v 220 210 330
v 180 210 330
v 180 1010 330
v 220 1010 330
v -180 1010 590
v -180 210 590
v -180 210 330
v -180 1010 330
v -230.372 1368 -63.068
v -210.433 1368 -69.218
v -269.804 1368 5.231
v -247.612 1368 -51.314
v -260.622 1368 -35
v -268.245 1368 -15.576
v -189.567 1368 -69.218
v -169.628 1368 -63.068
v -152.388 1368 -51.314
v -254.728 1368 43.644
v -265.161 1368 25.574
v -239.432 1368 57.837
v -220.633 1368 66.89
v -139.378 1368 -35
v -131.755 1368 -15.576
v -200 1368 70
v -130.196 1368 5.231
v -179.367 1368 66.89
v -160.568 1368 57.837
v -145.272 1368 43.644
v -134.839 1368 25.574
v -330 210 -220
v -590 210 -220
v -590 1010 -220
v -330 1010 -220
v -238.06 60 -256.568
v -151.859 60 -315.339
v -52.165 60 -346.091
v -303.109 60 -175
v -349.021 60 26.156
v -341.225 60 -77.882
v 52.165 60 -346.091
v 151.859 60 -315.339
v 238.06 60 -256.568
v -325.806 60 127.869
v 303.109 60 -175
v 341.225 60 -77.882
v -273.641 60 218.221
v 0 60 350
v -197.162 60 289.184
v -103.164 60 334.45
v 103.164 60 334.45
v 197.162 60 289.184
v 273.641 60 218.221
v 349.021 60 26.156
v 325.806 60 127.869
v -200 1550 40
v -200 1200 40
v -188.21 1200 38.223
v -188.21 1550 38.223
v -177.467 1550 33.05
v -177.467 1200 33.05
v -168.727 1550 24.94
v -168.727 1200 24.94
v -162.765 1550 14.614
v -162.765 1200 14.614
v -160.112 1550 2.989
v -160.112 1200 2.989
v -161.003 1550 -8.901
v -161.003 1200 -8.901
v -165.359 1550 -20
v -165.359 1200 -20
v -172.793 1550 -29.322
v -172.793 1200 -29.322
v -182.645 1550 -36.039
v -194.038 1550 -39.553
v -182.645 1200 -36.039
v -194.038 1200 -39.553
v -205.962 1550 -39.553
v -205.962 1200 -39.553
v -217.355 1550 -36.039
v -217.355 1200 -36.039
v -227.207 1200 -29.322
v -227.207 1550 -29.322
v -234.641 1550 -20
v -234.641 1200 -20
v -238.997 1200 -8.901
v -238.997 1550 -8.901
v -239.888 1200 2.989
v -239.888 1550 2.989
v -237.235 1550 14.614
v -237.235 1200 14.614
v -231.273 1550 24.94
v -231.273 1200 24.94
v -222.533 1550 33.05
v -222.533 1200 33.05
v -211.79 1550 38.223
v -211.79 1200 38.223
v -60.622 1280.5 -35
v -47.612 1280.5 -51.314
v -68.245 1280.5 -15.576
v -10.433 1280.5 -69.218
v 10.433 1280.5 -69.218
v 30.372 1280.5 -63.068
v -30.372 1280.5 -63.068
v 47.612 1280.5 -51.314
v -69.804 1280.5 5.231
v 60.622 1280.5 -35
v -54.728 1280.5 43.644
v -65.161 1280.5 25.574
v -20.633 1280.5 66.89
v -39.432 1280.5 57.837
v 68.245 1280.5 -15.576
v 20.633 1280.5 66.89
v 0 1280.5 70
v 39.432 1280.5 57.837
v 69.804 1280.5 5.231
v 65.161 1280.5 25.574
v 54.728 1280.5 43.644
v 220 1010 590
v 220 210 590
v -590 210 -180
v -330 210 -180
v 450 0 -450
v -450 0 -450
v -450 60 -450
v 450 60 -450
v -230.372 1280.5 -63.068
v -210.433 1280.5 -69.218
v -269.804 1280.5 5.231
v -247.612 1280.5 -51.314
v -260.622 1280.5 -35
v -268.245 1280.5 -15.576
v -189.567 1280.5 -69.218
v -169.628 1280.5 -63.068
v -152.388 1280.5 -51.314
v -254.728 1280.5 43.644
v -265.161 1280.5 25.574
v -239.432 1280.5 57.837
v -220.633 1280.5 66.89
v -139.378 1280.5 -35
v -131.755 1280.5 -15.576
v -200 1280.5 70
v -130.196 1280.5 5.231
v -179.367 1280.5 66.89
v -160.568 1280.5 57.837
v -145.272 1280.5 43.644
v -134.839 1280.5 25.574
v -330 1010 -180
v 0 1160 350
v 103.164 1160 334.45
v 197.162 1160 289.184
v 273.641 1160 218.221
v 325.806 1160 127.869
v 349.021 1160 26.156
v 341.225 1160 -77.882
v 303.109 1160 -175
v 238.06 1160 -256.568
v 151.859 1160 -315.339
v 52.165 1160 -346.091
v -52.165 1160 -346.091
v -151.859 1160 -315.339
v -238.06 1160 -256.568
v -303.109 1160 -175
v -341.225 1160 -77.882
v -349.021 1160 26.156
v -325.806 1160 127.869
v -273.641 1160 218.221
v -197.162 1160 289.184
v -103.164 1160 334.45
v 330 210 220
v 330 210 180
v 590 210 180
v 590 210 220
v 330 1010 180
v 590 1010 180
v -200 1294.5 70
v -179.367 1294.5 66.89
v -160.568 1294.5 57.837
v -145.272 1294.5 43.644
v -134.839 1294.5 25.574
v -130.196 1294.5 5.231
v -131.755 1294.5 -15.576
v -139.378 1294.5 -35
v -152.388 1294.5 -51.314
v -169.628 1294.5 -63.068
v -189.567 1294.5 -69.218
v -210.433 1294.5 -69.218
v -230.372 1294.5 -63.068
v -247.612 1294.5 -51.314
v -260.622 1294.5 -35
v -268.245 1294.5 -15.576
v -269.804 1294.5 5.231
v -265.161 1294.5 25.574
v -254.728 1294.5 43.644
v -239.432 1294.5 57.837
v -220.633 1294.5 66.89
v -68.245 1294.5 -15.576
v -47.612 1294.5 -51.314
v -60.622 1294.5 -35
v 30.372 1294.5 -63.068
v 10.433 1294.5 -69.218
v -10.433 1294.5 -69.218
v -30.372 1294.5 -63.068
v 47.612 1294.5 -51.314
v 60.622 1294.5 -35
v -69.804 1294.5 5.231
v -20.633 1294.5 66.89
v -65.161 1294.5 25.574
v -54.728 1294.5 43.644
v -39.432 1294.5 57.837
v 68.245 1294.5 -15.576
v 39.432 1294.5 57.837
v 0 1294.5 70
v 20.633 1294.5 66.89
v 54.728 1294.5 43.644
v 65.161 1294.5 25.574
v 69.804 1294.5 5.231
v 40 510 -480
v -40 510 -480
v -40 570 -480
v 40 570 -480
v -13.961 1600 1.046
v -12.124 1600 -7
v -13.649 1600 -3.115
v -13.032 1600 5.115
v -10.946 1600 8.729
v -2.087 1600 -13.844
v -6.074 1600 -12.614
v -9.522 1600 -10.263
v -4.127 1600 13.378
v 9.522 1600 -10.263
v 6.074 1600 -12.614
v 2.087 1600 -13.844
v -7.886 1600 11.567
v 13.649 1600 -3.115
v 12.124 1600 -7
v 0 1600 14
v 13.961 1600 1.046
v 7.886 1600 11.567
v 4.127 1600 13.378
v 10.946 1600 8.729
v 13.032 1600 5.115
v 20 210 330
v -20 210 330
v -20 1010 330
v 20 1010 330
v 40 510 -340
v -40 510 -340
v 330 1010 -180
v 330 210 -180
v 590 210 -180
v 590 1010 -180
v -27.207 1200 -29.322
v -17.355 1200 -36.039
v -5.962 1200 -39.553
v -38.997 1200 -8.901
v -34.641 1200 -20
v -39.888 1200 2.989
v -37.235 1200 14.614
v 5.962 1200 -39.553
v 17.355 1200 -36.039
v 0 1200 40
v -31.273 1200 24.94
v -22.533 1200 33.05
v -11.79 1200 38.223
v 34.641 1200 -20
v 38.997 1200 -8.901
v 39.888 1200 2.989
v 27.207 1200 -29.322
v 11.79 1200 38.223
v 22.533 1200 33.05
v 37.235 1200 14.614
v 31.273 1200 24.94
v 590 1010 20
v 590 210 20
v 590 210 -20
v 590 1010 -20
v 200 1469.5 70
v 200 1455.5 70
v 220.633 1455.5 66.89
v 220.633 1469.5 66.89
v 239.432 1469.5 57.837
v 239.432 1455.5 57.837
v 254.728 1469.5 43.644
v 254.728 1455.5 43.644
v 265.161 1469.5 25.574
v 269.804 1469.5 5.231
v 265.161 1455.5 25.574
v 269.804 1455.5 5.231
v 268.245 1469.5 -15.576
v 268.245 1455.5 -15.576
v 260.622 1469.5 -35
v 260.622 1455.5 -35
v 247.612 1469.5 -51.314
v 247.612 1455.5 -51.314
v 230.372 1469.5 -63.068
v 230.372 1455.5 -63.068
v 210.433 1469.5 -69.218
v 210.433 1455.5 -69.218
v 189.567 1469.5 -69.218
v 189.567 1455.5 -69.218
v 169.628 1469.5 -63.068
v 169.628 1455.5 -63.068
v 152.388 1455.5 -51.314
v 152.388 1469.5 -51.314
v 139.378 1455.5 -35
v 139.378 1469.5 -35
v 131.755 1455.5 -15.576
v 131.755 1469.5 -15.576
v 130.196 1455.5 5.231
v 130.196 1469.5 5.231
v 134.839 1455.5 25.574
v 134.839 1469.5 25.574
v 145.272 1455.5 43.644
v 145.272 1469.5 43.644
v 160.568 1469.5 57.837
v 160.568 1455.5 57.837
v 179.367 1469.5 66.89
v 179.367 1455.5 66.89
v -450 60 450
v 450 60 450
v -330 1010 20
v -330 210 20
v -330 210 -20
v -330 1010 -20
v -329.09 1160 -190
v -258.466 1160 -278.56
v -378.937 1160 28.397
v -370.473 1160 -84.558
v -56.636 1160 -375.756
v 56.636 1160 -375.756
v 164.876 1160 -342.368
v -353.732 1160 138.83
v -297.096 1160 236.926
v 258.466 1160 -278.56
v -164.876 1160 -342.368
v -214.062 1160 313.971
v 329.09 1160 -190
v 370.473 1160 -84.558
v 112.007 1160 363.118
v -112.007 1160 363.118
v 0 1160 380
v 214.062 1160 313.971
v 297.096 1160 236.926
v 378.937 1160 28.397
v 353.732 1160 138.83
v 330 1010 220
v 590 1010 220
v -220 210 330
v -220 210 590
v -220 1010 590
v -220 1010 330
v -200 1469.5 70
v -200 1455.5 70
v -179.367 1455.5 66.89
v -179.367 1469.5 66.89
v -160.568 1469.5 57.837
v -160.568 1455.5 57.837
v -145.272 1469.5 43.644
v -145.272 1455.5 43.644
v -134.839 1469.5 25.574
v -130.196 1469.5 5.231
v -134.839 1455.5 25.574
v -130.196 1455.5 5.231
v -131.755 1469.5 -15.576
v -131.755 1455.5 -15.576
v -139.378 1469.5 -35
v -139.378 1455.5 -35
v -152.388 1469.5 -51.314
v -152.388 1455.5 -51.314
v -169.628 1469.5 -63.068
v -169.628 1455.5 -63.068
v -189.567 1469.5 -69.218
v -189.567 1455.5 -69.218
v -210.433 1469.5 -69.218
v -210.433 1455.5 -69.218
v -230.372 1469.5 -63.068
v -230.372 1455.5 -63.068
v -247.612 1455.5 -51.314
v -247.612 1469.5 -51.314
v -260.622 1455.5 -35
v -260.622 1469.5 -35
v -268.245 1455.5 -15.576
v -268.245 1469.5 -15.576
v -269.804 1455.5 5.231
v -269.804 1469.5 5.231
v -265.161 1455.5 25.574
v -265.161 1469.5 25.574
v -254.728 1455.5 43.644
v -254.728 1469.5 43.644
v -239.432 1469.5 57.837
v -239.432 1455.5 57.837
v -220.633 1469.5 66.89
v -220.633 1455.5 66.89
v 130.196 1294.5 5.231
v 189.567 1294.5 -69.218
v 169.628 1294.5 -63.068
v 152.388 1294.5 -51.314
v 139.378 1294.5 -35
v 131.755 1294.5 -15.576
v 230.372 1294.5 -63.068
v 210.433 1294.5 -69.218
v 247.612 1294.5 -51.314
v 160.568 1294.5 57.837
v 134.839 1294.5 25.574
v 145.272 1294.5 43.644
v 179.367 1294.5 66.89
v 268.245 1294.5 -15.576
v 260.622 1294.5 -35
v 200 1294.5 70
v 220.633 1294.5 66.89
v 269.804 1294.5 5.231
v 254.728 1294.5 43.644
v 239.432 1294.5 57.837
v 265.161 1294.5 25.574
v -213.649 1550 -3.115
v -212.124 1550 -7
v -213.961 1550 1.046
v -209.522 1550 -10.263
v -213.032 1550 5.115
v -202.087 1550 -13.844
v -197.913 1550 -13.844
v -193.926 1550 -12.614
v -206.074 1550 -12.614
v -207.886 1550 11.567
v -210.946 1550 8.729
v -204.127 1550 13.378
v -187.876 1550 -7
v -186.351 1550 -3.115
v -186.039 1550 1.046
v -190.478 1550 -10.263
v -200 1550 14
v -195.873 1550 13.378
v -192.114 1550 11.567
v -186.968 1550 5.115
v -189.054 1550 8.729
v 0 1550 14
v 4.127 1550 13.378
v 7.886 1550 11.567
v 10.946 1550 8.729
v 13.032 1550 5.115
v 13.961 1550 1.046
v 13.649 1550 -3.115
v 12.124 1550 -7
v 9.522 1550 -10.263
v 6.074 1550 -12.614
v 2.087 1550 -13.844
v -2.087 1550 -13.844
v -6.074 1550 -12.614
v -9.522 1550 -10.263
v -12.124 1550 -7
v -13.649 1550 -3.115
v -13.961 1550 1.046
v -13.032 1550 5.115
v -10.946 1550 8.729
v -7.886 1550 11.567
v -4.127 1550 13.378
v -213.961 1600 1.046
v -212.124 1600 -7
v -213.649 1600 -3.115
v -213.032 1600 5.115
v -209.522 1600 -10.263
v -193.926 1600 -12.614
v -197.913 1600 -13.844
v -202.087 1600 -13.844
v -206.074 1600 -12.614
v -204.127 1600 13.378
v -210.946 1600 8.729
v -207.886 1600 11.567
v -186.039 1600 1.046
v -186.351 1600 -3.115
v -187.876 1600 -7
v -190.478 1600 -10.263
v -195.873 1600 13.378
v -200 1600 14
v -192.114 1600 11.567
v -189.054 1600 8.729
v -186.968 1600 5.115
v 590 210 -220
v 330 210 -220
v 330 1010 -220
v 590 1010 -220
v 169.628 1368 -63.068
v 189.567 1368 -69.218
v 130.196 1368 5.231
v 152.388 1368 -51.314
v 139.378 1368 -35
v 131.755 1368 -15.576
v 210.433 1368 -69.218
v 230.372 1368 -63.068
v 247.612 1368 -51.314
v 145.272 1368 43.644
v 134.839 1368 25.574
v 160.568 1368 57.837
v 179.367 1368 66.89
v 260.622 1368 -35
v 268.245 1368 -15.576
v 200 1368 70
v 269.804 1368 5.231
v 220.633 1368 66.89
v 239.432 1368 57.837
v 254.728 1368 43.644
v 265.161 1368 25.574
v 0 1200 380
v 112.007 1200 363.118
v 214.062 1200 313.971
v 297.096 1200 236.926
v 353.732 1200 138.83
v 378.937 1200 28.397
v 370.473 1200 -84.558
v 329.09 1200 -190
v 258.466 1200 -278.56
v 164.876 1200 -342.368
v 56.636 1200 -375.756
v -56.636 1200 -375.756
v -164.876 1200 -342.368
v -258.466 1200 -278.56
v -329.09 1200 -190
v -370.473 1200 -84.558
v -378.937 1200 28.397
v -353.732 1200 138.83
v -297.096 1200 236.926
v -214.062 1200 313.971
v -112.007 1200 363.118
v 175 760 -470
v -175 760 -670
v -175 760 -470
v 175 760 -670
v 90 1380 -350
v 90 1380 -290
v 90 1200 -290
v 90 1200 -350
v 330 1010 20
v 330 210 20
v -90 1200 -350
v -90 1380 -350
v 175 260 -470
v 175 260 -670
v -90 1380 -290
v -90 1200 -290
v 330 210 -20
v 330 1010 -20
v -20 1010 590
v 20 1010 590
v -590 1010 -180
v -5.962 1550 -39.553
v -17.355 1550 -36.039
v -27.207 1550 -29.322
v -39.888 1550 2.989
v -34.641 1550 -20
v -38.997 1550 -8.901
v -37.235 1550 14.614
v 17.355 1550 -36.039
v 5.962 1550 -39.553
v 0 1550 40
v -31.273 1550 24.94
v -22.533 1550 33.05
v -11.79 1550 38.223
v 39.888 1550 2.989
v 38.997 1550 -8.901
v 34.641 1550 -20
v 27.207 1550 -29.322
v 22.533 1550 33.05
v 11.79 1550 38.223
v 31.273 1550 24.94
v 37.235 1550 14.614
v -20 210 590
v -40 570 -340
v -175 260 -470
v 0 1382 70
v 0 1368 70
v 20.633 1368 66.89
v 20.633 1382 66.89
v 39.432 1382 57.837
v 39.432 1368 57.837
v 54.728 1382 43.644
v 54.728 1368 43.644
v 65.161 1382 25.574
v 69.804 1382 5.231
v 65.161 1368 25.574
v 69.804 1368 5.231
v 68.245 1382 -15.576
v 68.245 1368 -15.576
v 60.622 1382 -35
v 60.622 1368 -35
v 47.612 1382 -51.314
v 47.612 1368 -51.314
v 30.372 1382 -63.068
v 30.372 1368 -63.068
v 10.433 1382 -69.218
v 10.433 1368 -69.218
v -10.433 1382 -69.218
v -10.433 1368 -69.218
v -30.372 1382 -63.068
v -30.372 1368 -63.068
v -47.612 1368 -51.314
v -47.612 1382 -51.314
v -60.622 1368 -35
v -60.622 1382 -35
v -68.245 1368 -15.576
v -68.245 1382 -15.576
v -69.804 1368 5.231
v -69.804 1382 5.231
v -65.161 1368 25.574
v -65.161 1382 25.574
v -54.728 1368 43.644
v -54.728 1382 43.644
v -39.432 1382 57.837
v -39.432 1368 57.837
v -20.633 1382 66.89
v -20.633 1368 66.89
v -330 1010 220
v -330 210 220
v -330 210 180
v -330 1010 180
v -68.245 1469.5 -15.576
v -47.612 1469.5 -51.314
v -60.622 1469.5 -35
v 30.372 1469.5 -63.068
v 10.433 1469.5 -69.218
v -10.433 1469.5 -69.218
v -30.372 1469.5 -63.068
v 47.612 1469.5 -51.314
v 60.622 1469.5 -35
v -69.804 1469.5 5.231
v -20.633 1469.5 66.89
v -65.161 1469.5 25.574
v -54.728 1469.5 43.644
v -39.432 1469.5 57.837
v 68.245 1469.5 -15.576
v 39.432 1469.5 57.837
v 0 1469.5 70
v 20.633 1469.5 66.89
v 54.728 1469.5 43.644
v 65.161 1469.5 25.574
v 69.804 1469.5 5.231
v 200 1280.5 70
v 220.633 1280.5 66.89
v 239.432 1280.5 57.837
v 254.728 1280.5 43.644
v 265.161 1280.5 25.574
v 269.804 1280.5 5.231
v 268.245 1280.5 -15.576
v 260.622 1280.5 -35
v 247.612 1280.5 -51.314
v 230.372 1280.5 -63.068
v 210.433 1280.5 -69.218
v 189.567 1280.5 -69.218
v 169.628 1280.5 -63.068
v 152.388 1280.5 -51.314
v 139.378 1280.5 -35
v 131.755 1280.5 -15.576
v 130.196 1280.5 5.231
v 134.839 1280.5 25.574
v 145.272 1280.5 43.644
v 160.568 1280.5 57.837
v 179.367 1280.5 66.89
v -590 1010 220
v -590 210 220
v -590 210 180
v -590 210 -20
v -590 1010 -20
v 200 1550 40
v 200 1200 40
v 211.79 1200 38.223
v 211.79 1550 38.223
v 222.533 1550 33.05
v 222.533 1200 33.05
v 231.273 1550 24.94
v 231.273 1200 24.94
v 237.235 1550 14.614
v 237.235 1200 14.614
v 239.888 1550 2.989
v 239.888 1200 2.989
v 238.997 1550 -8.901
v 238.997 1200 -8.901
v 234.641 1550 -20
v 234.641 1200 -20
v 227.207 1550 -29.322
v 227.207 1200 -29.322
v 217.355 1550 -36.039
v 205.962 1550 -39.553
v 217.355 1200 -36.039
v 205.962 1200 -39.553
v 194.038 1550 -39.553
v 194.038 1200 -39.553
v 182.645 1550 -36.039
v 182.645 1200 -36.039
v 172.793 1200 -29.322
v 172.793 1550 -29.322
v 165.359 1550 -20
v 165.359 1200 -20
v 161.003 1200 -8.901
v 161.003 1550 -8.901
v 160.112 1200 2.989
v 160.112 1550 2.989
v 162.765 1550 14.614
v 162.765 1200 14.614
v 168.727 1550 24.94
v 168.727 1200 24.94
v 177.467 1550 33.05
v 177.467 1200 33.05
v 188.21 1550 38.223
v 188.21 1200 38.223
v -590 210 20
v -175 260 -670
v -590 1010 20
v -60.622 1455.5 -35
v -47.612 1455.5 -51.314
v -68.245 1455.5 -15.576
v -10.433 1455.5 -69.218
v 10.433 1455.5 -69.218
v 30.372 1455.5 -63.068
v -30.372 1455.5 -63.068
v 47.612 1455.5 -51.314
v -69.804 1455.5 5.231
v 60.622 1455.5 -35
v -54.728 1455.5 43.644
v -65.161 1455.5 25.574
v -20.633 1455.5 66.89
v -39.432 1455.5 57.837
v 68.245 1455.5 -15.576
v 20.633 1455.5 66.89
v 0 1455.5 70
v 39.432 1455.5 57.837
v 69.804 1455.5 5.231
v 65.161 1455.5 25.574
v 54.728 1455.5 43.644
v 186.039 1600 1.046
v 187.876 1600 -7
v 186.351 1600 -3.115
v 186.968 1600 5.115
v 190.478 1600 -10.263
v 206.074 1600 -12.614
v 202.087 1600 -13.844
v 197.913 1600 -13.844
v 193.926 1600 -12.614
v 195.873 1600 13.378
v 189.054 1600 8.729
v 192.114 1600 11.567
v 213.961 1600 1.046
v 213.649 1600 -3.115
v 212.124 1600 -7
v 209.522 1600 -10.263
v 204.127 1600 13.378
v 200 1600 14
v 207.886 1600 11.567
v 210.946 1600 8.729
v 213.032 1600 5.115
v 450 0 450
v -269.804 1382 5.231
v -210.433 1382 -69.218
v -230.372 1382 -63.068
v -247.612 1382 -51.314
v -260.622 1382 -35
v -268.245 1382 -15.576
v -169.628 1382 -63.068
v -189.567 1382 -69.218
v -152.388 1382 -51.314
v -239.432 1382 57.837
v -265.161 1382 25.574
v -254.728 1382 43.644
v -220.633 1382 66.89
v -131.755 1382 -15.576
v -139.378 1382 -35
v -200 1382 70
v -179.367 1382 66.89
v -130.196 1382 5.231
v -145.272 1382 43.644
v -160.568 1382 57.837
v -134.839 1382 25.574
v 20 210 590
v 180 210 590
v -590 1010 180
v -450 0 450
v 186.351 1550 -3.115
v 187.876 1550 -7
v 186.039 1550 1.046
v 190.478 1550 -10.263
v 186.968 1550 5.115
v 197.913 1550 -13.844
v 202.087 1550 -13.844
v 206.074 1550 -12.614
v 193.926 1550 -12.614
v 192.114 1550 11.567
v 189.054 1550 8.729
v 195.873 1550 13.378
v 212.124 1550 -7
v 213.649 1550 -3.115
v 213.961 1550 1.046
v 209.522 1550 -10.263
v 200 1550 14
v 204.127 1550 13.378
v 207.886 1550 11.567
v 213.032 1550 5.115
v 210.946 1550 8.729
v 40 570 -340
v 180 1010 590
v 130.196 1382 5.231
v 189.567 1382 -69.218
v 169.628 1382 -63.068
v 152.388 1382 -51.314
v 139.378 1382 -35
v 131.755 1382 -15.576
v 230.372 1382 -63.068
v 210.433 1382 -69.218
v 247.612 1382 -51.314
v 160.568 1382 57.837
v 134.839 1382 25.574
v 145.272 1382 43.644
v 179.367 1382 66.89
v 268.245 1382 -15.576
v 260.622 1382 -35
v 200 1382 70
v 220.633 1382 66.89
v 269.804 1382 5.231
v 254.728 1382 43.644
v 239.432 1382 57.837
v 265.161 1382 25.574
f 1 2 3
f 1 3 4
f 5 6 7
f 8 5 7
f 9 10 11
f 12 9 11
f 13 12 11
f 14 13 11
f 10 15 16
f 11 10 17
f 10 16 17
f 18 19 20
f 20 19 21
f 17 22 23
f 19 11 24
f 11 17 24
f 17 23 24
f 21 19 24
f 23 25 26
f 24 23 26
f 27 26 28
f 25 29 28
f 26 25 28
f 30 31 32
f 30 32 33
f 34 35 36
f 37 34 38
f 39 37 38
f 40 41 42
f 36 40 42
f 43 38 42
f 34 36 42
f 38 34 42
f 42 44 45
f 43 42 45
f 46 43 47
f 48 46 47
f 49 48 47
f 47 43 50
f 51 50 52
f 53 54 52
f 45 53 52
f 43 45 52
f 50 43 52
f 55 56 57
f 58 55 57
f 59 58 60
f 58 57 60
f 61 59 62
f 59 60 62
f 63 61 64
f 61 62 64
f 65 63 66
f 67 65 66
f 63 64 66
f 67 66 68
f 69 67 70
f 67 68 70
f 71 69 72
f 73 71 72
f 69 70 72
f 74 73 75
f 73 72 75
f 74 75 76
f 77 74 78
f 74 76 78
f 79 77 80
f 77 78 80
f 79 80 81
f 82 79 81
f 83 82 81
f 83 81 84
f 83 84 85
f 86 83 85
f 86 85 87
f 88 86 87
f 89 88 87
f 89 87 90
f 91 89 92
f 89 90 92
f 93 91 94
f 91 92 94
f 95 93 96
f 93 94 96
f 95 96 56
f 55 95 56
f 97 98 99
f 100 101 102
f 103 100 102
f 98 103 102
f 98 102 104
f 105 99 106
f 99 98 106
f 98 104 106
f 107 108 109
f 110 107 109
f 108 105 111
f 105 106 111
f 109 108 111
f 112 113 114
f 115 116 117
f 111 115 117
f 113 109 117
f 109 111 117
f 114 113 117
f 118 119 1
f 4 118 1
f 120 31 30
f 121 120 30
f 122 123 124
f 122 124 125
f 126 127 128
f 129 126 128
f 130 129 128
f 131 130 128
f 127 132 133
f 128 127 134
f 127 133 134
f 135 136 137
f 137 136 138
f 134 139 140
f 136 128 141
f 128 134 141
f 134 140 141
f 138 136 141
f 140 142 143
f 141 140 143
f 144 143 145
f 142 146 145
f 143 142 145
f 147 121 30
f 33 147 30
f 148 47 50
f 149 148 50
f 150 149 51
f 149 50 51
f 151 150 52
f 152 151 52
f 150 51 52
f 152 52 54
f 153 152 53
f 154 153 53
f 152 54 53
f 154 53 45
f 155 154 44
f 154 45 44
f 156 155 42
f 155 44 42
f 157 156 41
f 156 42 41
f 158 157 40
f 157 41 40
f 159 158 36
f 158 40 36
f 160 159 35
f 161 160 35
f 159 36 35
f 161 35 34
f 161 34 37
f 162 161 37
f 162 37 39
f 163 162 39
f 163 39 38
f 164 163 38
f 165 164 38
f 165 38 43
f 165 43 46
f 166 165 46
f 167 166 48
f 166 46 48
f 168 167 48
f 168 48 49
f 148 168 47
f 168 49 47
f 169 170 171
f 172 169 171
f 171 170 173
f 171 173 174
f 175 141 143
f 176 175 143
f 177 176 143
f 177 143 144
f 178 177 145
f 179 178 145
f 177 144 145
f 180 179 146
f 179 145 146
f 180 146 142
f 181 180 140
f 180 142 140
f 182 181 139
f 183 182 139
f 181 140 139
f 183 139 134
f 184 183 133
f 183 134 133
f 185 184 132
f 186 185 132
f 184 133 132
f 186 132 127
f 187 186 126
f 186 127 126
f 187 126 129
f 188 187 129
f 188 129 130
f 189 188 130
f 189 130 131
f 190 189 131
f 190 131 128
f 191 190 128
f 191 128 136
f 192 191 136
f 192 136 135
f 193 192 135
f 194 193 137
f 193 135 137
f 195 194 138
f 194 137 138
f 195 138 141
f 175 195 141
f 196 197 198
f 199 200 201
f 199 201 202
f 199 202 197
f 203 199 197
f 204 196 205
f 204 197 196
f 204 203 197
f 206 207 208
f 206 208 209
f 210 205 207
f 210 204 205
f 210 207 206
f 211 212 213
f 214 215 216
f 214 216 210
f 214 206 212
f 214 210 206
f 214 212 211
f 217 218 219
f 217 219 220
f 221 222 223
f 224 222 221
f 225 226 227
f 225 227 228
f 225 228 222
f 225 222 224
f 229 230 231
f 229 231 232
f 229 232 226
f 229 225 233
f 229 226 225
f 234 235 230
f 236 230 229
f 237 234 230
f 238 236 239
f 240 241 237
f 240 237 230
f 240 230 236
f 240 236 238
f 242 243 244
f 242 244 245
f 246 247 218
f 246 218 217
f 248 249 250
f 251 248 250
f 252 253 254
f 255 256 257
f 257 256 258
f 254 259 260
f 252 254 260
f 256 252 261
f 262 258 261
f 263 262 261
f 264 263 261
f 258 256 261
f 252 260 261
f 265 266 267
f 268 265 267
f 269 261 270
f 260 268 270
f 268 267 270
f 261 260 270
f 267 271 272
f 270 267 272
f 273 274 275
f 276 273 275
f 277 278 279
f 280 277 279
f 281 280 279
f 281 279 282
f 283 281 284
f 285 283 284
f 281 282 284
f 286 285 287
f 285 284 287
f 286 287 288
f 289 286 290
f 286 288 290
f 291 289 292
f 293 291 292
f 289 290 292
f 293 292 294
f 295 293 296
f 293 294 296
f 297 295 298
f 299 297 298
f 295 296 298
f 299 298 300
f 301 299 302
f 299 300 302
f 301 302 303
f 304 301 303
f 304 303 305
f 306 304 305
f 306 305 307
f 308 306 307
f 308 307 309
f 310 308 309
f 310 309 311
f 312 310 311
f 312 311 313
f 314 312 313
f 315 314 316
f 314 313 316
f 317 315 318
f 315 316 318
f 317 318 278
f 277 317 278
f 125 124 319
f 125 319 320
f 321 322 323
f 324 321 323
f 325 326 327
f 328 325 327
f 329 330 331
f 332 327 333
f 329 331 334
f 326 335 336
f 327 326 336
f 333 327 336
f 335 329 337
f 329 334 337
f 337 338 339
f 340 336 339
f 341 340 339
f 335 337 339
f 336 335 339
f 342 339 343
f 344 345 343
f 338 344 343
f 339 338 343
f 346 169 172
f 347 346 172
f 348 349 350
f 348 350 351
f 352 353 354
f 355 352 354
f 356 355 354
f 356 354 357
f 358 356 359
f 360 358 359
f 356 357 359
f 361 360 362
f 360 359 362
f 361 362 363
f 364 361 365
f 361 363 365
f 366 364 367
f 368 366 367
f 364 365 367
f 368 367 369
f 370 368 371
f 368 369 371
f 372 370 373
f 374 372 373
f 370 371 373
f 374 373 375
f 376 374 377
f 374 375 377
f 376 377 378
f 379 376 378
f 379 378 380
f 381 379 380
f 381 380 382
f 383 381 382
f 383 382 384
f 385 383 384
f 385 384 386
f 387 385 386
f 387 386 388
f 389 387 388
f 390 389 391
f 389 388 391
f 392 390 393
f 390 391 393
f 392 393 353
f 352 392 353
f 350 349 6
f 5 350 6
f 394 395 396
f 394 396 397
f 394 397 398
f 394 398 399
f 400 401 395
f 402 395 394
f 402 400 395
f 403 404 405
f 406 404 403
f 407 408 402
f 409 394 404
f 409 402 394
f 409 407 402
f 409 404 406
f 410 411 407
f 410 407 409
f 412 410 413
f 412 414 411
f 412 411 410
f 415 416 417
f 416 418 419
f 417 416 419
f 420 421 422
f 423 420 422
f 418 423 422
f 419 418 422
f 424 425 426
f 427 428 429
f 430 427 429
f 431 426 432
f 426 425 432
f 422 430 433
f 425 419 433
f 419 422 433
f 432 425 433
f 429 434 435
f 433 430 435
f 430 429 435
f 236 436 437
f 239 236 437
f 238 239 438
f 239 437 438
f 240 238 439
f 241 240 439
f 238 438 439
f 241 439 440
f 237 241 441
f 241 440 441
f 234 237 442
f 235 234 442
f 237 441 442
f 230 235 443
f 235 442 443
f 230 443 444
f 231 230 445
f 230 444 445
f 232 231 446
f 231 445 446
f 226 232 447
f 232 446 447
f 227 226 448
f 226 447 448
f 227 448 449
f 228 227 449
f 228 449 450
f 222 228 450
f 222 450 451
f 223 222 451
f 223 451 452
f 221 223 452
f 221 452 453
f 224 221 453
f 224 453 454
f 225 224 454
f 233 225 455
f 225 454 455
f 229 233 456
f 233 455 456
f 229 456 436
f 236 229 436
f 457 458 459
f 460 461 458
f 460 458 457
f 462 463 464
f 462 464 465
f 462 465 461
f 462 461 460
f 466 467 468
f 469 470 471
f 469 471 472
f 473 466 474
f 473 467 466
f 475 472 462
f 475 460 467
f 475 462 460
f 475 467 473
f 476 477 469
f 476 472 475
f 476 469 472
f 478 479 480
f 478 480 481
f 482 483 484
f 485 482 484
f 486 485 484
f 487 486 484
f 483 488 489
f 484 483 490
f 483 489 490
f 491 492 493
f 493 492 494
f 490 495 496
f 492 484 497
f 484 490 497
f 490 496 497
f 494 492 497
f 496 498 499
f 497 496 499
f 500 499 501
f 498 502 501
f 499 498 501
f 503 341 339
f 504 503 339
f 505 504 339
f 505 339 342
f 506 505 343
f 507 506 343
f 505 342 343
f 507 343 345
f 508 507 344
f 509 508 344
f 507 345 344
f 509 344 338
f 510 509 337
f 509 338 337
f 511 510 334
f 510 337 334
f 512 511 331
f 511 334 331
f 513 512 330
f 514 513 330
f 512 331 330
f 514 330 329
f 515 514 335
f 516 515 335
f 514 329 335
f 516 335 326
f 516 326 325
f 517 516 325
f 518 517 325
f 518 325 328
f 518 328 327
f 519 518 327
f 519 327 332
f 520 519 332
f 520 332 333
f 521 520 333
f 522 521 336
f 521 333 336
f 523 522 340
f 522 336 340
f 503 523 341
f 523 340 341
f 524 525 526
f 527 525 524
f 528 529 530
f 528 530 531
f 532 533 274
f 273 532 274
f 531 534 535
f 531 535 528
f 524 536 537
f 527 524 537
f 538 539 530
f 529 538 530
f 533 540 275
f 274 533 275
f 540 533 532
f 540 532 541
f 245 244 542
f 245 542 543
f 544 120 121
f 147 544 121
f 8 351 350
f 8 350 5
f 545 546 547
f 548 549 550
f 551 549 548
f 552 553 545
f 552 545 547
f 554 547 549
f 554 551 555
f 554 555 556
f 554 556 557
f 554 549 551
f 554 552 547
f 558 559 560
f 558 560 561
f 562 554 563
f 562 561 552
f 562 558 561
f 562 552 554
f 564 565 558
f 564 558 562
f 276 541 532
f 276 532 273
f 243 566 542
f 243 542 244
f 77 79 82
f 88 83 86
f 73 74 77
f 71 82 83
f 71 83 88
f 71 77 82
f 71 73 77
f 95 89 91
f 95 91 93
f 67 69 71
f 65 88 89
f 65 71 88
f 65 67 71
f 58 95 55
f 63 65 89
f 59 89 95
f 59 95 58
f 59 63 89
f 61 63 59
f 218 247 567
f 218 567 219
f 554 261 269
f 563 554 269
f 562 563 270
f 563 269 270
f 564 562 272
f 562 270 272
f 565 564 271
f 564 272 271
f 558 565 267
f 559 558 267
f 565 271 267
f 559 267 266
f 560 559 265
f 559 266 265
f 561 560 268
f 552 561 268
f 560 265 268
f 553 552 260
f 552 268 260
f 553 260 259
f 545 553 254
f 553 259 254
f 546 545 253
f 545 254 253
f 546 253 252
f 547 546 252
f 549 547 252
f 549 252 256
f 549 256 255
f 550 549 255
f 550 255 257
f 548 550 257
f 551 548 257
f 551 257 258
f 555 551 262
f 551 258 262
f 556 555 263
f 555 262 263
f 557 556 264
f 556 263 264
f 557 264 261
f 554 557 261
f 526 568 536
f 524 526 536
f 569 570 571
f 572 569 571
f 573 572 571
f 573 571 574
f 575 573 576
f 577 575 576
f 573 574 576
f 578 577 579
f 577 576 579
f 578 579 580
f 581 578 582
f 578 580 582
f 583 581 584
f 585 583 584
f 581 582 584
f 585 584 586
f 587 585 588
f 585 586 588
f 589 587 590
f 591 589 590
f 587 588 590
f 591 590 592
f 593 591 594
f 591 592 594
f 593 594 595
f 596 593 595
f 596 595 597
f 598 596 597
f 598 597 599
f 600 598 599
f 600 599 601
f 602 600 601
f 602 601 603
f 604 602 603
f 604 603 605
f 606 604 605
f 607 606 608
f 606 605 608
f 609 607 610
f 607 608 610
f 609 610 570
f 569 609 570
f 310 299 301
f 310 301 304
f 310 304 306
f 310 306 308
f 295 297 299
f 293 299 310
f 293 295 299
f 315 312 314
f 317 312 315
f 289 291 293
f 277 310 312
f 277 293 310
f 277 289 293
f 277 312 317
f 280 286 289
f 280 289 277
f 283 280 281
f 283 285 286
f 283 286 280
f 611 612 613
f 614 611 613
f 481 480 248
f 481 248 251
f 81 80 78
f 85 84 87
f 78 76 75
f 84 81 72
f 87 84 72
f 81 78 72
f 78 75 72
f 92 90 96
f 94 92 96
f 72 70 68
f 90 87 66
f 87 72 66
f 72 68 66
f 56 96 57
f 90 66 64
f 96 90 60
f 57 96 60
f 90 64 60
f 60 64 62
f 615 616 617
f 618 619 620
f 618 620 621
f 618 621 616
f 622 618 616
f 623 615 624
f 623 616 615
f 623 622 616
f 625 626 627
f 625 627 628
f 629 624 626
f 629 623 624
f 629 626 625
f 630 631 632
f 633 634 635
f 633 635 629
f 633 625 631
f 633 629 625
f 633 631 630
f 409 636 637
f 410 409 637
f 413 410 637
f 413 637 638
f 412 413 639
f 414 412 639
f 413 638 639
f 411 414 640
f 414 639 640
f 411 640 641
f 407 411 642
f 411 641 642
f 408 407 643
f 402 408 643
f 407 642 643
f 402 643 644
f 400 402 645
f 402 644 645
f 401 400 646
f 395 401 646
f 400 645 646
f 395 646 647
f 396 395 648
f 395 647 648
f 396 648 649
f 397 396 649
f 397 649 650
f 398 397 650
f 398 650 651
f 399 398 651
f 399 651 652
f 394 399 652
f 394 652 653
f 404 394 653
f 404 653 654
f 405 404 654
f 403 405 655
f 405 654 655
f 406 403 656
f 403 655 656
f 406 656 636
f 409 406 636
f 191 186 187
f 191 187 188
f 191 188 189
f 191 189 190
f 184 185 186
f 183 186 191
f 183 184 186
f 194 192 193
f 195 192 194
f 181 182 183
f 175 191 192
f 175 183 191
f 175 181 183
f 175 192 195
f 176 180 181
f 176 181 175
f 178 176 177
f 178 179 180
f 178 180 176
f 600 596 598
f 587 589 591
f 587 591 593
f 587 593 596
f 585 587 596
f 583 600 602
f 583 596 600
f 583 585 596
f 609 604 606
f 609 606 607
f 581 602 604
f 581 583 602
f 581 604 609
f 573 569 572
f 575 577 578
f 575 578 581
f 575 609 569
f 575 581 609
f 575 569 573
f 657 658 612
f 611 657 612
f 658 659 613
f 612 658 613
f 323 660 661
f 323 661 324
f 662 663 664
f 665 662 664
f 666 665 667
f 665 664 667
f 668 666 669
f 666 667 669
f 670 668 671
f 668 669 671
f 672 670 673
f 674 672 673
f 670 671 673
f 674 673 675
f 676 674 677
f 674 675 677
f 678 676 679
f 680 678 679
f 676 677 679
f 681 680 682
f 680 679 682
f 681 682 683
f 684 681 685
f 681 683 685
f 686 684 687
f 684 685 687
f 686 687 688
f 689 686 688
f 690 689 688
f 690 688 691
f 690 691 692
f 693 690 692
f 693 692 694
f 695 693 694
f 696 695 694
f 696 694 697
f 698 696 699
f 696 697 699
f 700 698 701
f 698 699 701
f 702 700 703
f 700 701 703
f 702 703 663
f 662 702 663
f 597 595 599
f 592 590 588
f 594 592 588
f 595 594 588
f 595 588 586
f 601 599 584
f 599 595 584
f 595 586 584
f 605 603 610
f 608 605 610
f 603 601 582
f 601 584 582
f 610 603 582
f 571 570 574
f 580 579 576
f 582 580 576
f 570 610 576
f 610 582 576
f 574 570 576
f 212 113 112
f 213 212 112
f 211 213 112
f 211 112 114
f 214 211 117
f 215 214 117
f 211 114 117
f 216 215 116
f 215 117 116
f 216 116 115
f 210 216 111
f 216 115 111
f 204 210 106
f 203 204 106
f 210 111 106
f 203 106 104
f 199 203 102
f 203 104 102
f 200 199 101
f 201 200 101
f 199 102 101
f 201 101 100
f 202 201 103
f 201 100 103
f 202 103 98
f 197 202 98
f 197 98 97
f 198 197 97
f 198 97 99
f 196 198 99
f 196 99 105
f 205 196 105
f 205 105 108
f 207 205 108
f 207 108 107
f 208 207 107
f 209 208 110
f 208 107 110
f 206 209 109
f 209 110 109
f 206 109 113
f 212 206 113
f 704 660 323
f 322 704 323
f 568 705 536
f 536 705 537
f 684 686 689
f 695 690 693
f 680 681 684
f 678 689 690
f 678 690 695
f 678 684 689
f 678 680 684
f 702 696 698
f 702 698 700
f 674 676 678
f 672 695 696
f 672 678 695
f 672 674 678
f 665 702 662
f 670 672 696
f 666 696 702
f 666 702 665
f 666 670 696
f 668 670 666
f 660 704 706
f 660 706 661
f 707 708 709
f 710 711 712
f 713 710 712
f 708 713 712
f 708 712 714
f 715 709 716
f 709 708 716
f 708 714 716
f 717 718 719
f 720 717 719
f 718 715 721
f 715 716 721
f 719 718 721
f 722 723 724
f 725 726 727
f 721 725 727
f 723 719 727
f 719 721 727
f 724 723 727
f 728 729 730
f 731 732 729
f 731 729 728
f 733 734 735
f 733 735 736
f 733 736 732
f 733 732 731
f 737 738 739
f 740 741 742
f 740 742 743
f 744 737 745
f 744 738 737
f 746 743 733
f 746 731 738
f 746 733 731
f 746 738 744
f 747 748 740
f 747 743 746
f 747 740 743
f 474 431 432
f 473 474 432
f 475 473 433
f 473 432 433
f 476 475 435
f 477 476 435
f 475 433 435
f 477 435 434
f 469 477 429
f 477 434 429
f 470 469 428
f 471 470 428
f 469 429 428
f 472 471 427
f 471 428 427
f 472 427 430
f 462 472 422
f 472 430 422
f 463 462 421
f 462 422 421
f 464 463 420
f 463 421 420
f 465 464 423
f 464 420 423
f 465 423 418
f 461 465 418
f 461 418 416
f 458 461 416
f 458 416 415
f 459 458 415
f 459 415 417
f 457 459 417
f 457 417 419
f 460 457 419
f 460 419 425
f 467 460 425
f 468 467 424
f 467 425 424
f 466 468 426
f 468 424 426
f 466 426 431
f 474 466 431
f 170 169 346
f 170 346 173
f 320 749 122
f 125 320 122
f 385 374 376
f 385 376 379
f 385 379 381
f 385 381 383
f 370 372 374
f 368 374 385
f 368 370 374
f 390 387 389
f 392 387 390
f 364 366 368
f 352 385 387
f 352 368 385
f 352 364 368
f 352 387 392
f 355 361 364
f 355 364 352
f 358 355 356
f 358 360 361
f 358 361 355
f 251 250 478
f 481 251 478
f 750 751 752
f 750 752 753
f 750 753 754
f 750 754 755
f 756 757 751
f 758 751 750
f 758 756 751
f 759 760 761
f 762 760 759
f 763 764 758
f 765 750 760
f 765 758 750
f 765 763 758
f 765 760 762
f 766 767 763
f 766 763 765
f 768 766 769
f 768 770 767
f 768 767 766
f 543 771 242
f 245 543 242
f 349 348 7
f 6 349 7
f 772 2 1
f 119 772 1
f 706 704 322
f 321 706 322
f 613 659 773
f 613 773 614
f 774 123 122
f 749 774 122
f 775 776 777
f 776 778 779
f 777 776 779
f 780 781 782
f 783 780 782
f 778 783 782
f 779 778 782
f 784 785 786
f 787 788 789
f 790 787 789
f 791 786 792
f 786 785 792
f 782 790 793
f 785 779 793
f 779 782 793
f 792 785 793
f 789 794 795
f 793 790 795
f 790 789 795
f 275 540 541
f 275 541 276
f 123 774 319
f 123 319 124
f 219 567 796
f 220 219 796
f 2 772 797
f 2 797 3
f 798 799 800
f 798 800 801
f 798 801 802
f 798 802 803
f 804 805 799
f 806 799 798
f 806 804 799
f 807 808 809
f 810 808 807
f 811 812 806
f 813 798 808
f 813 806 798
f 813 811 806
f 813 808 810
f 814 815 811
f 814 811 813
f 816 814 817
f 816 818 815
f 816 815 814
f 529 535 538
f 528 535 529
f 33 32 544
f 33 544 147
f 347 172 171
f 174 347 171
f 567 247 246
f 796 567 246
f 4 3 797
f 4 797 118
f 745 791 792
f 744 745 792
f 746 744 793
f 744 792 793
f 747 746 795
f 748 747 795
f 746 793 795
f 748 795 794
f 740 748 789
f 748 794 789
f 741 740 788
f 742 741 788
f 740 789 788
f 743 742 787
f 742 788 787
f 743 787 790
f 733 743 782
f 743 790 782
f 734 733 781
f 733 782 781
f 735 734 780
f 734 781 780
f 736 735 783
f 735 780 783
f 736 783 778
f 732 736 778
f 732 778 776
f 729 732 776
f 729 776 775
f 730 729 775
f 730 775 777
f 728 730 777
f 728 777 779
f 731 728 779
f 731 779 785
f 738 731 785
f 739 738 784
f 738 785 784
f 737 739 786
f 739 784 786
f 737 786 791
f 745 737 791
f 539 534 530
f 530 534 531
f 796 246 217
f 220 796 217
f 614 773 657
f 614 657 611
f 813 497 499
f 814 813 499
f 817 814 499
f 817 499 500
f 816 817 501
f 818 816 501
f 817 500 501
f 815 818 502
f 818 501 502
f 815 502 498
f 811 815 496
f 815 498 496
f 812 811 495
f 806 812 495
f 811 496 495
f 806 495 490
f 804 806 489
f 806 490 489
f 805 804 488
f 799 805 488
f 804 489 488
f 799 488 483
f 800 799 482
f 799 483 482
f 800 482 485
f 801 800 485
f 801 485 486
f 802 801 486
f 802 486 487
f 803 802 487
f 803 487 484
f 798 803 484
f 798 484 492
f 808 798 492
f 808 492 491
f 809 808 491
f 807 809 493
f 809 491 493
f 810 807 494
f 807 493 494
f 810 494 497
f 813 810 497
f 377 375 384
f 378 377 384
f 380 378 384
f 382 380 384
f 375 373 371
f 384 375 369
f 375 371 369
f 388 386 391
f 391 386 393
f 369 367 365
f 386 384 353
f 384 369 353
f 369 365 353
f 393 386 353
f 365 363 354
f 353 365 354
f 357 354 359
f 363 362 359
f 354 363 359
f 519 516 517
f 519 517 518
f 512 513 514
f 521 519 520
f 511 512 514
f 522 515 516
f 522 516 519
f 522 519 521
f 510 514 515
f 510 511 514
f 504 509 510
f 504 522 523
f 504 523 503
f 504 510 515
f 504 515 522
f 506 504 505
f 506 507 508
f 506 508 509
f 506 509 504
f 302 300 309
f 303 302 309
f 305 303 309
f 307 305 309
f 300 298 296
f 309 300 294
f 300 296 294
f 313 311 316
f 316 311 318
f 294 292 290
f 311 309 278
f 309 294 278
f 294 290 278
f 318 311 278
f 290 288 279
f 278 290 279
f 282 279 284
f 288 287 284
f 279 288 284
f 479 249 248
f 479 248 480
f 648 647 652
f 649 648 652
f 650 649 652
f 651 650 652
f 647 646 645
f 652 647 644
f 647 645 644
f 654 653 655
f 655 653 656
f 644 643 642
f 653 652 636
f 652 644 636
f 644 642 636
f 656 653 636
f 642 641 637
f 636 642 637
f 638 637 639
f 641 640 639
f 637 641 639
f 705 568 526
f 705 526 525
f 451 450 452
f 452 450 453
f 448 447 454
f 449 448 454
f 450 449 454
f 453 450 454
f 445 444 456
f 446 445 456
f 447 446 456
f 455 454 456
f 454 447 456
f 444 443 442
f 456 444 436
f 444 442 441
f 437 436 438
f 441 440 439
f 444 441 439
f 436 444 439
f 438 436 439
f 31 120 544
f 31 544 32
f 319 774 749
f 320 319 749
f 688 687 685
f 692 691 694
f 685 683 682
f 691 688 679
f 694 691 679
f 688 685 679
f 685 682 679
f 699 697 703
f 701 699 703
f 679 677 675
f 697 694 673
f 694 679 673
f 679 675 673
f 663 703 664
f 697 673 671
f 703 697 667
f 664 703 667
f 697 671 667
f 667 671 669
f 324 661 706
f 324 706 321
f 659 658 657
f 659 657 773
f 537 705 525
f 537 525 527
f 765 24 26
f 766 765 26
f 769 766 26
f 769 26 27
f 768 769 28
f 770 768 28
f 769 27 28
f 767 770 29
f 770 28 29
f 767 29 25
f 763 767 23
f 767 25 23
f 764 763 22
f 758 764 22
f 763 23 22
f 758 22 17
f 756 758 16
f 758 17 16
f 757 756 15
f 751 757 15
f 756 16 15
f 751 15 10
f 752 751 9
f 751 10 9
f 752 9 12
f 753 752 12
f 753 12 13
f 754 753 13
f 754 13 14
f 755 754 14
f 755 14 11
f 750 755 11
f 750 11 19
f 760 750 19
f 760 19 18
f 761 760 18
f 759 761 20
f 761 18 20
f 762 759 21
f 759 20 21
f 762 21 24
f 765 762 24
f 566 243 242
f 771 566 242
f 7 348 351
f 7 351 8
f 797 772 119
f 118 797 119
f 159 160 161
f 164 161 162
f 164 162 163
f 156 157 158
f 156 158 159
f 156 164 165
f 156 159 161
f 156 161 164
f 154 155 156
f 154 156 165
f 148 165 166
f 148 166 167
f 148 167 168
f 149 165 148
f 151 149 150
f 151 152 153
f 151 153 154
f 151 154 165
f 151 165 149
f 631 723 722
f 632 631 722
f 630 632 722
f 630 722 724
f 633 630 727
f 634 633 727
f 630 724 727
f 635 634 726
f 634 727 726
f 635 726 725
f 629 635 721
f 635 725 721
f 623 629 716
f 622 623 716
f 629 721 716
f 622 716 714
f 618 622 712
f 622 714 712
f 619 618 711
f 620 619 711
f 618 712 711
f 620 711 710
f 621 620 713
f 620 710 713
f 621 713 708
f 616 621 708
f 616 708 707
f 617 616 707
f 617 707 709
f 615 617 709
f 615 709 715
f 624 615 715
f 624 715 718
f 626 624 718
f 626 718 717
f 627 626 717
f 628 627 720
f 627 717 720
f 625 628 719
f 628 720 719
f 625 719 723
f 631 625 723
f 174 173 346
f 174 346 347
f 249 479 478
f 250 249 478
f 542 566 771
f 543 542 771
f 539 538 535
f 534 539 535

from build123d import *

# Parameters (mm, degrees)
SKETCH1_W                = 900
SKETCH1_H                = 900
BASE_DEPTH               = 60
TANK_START               = 60
SKETCH2_R                = 350
TANK_DEPTH               = 1100
LID_START                = 1160
SKETCH3_R                = 380
LID_DEPTH                = 40
FIN_START                = 210
SKETCH4_W                = 260
SKETCH4_H                = 40
FIN_X_1_DEPTH            = 800
SKETCH5_W                = 260
SKETCH5_H                = 40
FIN_X_1_2_DEPTH          = 800
SKETCH6_W                = 40
SKETCH6_H                = 260
FIN_Z_1_DEPTH            = 800
SKETCH7_W                = 260
SKETCH7_H                = 40
FIN_X_2_DEPTH            = 800
SKETCH8_W                = 260
SKETCH8_H                = 40
FIN_X_2_2_DEPTH          = 800
SKETCH9_W                = 40
SKETCH9_H                = 260
FIN_Z_2_DEPTH            = 800
SKETCH10_W               = 260
SKETCH10_H               = 40
FIN_X_3_DEPTH            = 800
SKETCH11_W               = 260
SKETCH11_H               = 40
FIN_X_3_2_DEPTH          = 800
SKETCH12_W               = 40
SKETCH12_H               = 260
FIN_Z_3_DEPTH            = 800
BUSHING_START            = 1200
SKETCH13_R               = 40
BUSHING_S_DEPTH          = 350
SHED_START               = 1280.5
SKETCH14_R               = 70
SHED_S_1_DEPTH           = 14
SHED_START_2             = 1368
SKETCH15_R               = 70
SHED_S_2_DEPTH           = 14
SHED_START_3             = 1455.5
SKETCH16_R               = 70
SHED_S_3_DEPTH           = 14
TERMINAL_START           = 1550
SKETCH17_R               = 14
TERMINAL_S_DEPTH         = 50
SKETCH18_R               = 40
BUSHING_L_DEPTH          = 350
SKETCH19_R               = 70
SHED_L_1_DEPTH           = 14
SKETCH20_R               = 70
SHED_L_2_DEPTH           = 14
SKETCH21_R               = 70
SHED_L_3_DEPTH           = 14
SKETCH22_R               = 14
TERMINAL_L_DEPTH         = 50
SKETCH23_R               = 40
BUSHING_SL_DEPTH         = 350
SKETCH24_R               = 70
SHED_SL_1_DEPTH          = 14
SKETCH25_R               = 70
SHED_SL_2_DEPTH          = 14
SKETCH26_R               = 70
SHED_SL_3_DEPTH          = 14
SKETCH27_R               = 14
TERMINAL_SL_DEPTH        = 50
POSITION_START           = 1200
SKETCH28_W               = 180
SKETCH28_H               = 60
POSITION_INDICATOR_DEPTH = 180
CONTROL_START            = 260
SKETCH29_W               = 350
SKETCH29_H               = 200
CONTROL_CABINET_DEPTH    = 500
CABINET_START            = 510
SKETCH30_W               = 80
SKETCH30_H               = 140
CABINET_BRACKET_DEPTH    = 60


with BuildPart() as part:
    # Sketch1 → Base (new body)
    with BuildSketch(Plane(origin=(0, 0, 0), x_dir=(1, 0, 0), z_dir=(0, 1, 0))):
        Rectangle(SKETCH1_W, SKETCH1_H)
    extrude(amount=BASE_DEPTH)


with BuildPart() as body_2:
    # Sketch2 → Tank (new body)
    with BuildSketch(Plane(origin=(0, 0, 0), x_dir=(1, 0, 0), z_dir=(0, 1, 0)).offset(TANK_START)):
        with Locations(Location((0, 0, 0), (0, 0, 270))):
            Circle(SKETCH2_R)
    extrude(amount=TANK_DEPTH)


with BuildPart() as body_3:
    # Sketch3 → Lid (new body)
    with BuildSketch(Plane(origin=(0, 0, 0), x_dir=(1, 0, 0), z_dir=(0, 1, 0)).offset(LID_START)):
        with Locations(Location((0, 0, 0), (0, 0, 270))):
            Circle(SKETCH3_R)
    extrude(amount=LID_DEPTH)


with BuildPart() as body_4:
    # Sketch4 → Fin _x 1 (new body)
    with BuildSketch(Plane(origin=(0, 0, 0), x_dir=(1, 0, 0), z_dir=(0, 1, 0)).offset(FIN_START)):
        with Locations((460, 200)):
            Rectangle(SKETCH4_W, SKETCH4_H)
    extrude(amount=FIN_X_1_DEPTH)


with BuildPart() as body_5:
    # Sketch5 → Fin -x 1 2 (new body)
    with BuildSketch(Plane(origin=(0, 0, 0), x_dir=(1, 0, 0), z_dir=(0, 1, 0)).offset(FIN_START)):
        with Locations((-460, 200)):
            Rectangle(SKETCH5_W, SKETCH5_H)
    extrude(amount=FIN_X_1_2_DEPTH)


with BuildPart() as body_6:
    # Sketch6 → Fin +z 1 (new body)
    with BuildSketch(Plane(origin=(0, 0, 0), x_dir=(1, 0, 0), z_dir=(0, 1, 0)).offset(FIN_START)):
        with Locations((-200, -460)):
            Rectangle(SKETCH6_W, SKETCH6_H)
    extrude(amount=FIN_Z_1_DEPTH)


with BuildPart() as body_7:
    # Sketch7 → Fin _x 2 (new body)
    with BuildSketch(Plane(origin=(0, 0, 0), x_dir=(1, 0, 0), z_dir=(0, 1, 0)).offset(FIN_START)):
        with Locations((460, 0)):
            Rectangle(SKETCH7_W, SKETCH7_H)
    extrude(amount=FIN_X_2_DEPTH)


with BuildPart() as body_8:
    # Sketch8 → Fin -x 2 2 (new body)
    with BuildSketch(Plane(origin=(0, 0, 0), x_dir=(1, 0, 0), z_dir=(0, 1, 0)).offset(FIN_START)):
        with Locations((-460, 0)):
            Rectangle(SKETCH8_W, SKETCH8_H)
    extrude(amount=FIN_X_2_2_DEPTH)


with BuildPart() as body_9:
    # Sketch9 → Fin +z 2 (new body)
    with BuildSketch(Plane(origin=(0, 0, 0), x_dir=(1, 0, 0), z_dir=(0, 1, 0)).offset(FIN_START)):
        with Locations((0, -460)):
            Rectangle(SKETCH9_W, SKETCH9_H)
    extrude(amount=FIN_Z_2_DEPTH)


with BuildPart() as body_10:
    # Sketch10 → Fin _x 3 (new body)
    with BuildSketch(Plane(origin=(0, 0, 0), x_dir=(1, 0, 0), z_dir=(0, 1, 0)).offset(FIN_START)):
        with Locations((460, -200)):
            Rectangle(SKETCH10_W, SKETCH10_H)
    extrude(amount=FIN_X_3_DEPTH)


with BuildPart() as body_11:
    # Sketch11 → Fin -x 3 2 (new body)
    with BuildSketch(Plane(origin=(0, 0, 0), x_dir=(1, 0, 0), z_dir=(0, 1, 0)).offset(FIN_START)):
        with Locations((-460, -200)):
            Rectangle(SKETCH11_W, SKETCH11_H)
    extrude(amount=FIN_X_3_2_DEPTH)


with BuildPart() as body_12:
    # Sketch12 → Fin +z 3 (new body)
    with BuildSketch(Plane(origin=(0, 0, 0), x_dir=(1, 0, 0), z_dir=(0, 1, 0)).offset(FIN_START)):
        with Locations((200, -460)):
            Rectangle(SKETCH12_W, SKETCH12_H)
    extrude(amount=FIN_Z_3_DEPTH)


with BuildPart() as body_13:
    # Sketch13 → Bushing S (new body)
    with BuildSketch(Plane(origin=(0, 0, 0), x_dir=(1, 0, 0), z_dir=(0, 1, 0)).offset(BUSHING_START)):
        with Locations(Location((-200, 0, 0), (0, 0, 270))):
            Circle(SKETCH13_R)
    extrude(amount=BUSHING_S_DEPTH)


with BuildPart() as body_14:
    # Sketch14 → Shed S 1 (new body)
    with BuildSketch(Plane(origin=(0, 0, 0), x_dir=(1, 0, 0), z_dir=(0, 1, 0)).offset(SHED_START)):
        with Locations(Location((-200, 0, 0), (0, 0, 270))):
            Circle(SKETCH14_R)
    extrude(amount=SHED_S_1_DEPTH)


with BuildPart() as body_15:
    # Sketch15 → Shed S 2 (new body)
    with BuildSketch(Plane(origin=(0, 0, 0), x_dir=(1, 0, 0), z_dir=(0, 1, 0)).offset(SHED_START_2)):
        with Locations(Location((-200, 0, 0), (0, 0, 270))):
            Circle(SKETCH15_R)
    extrude(amount=SHED_S_2_DEPTH)


with BuildPart() as body_16:
    # Sketch16 → Shed S 3 (new body)
    with BuildSketch(Plane(origin=(0, 0, 0), x_dir=(1, 0, 0), z_dir=(0, 1, 0)).offset(SHED_START_3)):
        with Locations(Location((-200, 0, 0), (0, 0, 270))):
            Circle(SKETCH16_R)
    extrude(amount=SHED_S_3_DEPTH)


with BuildPart() as body_17:
    # Sketch17 → Terminal S (new body)
    with BuildSketch(Plane(origin=(0, 0, 0), x_dir=(1, 0, 0), z_dir=(0, 1, 0)).offset(TERMINAL_START)):
        with Locations(Location((-200, 0, 0), (0, 0, 270))):
            Circle(SKETCH17_R)
    extrude(amount=TERMINAL_S_DEPTH)


with BuildPart() as body_18:
    # Sketch18 → Bushing L (new body)
    with BuildSketch(Plane(origin=(0, 0, 0), x_dir=(1, 0, 0), z_dir=(0, 1, 0)).offset(BUSHING_START)):
        with Locations(Location((0, 0, 0), (0, 0, 270))):
            Circle(SKETCH18_R)
    extrude(amount=BUSHING_L_DEPTH)


with BuildPart() as body_19:
    # Sketch19 → Shed L 1 (new body)
    with BuildSketch(Plane(origin=(0, 0, 0), x_dir=(1, 0, 0), z_dir=(0, 1, 0)).offset(SHED_START)):
        with Locations(Location((0, 0, 0), (0, 0, 270))):
            Circle(SKETCH19_R)
    extrude(amount=SHED_L_1_DEPTH)


with BuildPart() as body_20:
    # Sketch20 → Shed L 2 (new body)
    with BuildSketch(Plane(origin=(0, 0, 0), x_dir=(1, 0, 0), z_dir=(0, 1, 0)).offset(SHED_START_2)):
        with Locations(Location((0, 0, 0), (0, 0, 270))):
            Circle(SKETCH20_R)
    extrude(amount=SHED_L_2_DEPTH)


with BuildPart() as body_21:
    # Sketch21 → Shed L 3 (new body)
    with BuildSketch(Plane(origin=(0, 0, 0), x_dir=(1, 0, 0), z_dir=(0, 1, 0)).offset(SHED_START_3)):
        with Locations(Location((0, 0, 0), (0, 0, 270))):
            Circle(SKETCH21_R)
    extrude(amount=SHED_L_3_DEPTH)


with BuildPart() as body_22:
    # Sketch22 → Terminal L (new body)
    with BuildSketch(Plane(origin=(0, 0, 0), x_dir=(1, 0, 0), z_dir=(0, 1, 0)).offset(TERMINAL_START)):
        with Locations(Location((0, 0, 0), (0, 0, 270))):
            Circle(SKETCH22_R)
    extrude(amount=TERMINAL_L_DEPTH)


with BuildPart() as body_23:
    # Sketch23 → Bushing SL (new body)
    with BuildSketch(Plane(origin=(0, 0, 0), x_dir=(1, 0, 0), z_dir=(0, 1, 0)).offset(BUSHING_START)):
        with Locations(Location((200, 0, 0), (0, 0, 270))):
            Circle(SKETCH23_R)
    extrude(amount=BUSHING_SL_DEPTH)


with BuildPart() as body_24:
    # Sketch24 → Shed SL 1 (new body)
    with BuildSketch(Plane(origin=(0, 0, 0), x_dir=(1, 0, 0), z_dir=(0, 1, 0)).offset(SHED_START)):
        with Locations(Location((200, 0, 0), (0, 0, 270))):
            Circle(SKETCH24_R)
    extrude(amount=SHED_SL_1_DEPTH)


with BuildPart() as body_25:
    # Sketch25 → Shed SL 2 (new body)
    with BuildSketch(Plane(origin=(0, 0, 0), x_dir=(1, 0, 0), z_dir=(0, 1, 0)).offset(SHED_START_2)):
        with Locations(Location((200, 0, 0), (0, 0, 270))):
            Circle(SKETCH25_R)
    extrude(amount=SHED_SL_2_DEPTH)


with BuildPart() as body_26:
    # Sketch26 → Shed SL 3 (new body)
    with BuildSketch(Plane(origin=(0, 0, 0), x_dir=(1, 0, 0), z_dir=(0, 1, 0)).offset(SHED_START_3)):
        with Locations(Location((200, 0, 0), (0, 0, 270))):
            Circle(SKETCH26_R)
    extrude(amount=SHED_SL_3_DEPTH)


with BuildPart() as body_27:
    # Sketch27 → Terminal SL (new body)
    with BuildSketch(Plane(origin=(0, 0, 0), x_dir=(1, 0, 0), z_dir=(0, 1, 0)).offset(TERMINAL_START)):
        with Locations(Location((200, 0, 0), (0, 0, 270))):
            Circle(SKETCH27_R)
    extrude(amount=TERMINAL_SL_DEPTH)


with BuildPart() as body_28:
    # Sketch28 → Position indicator (new body)
    with BuildSketch(Plane(origin=(0, 0, 0), x_dir=(1, 0, 0), z_dir=(0, 1, 0)).offset(POSITION_START)):
        with Locations((0, 320)):
            Rectangle(SKETCH28_W, SKETCH28_H)
    extrude(amount=POSITION_INDICATOR_DEPTH)


with BuildPart() as body_29:
    # Sketch29 → Control cabinet (new body)
    with BuildSketch(Plane(origin=(0, 0, 0), x_dir=(1, 0, 0), z_dir=(0, 1, 0)).offset(CONTROL_START)):
        with Locations((0, 570)):
            Rectangle(SKETCH29_W, SKETCH29_H)
    extrude(amount=CONTROL_CABINET_DEPTH)


with BuildPart() as body_30:
    # Sketch30 → Cabinet bracket (new body)
    with BuildSketch(Plane(origin=(0, 0, 0), x_dir=(1, 0, 0), z_dir=(0, 1, 0)).offset(CABINET_START)):
        with Locations((0, 410)):
            Rectangle(SKETCH30_W, SKETCH30_H)
    extrude(amount=CABINET_BRACKET_DEPTH)


solid = Compound([part.part, body_2.part, body_3.part, body_4.part, body_5.part, body_6.part, body_7.part, body_8.part, body_9.part, body_10.part, body_11.part, body_12.part, body_13.part, body_14.part, body_15.part, body_16.part, body_17.part, body_18.part, body_19.part, body_20.part, body_21.part, body_22.part, body_23.part, body_24.part, body_25.part, body_26.part, body_27.part, body_28.part, body_29.part, body_30.part])
